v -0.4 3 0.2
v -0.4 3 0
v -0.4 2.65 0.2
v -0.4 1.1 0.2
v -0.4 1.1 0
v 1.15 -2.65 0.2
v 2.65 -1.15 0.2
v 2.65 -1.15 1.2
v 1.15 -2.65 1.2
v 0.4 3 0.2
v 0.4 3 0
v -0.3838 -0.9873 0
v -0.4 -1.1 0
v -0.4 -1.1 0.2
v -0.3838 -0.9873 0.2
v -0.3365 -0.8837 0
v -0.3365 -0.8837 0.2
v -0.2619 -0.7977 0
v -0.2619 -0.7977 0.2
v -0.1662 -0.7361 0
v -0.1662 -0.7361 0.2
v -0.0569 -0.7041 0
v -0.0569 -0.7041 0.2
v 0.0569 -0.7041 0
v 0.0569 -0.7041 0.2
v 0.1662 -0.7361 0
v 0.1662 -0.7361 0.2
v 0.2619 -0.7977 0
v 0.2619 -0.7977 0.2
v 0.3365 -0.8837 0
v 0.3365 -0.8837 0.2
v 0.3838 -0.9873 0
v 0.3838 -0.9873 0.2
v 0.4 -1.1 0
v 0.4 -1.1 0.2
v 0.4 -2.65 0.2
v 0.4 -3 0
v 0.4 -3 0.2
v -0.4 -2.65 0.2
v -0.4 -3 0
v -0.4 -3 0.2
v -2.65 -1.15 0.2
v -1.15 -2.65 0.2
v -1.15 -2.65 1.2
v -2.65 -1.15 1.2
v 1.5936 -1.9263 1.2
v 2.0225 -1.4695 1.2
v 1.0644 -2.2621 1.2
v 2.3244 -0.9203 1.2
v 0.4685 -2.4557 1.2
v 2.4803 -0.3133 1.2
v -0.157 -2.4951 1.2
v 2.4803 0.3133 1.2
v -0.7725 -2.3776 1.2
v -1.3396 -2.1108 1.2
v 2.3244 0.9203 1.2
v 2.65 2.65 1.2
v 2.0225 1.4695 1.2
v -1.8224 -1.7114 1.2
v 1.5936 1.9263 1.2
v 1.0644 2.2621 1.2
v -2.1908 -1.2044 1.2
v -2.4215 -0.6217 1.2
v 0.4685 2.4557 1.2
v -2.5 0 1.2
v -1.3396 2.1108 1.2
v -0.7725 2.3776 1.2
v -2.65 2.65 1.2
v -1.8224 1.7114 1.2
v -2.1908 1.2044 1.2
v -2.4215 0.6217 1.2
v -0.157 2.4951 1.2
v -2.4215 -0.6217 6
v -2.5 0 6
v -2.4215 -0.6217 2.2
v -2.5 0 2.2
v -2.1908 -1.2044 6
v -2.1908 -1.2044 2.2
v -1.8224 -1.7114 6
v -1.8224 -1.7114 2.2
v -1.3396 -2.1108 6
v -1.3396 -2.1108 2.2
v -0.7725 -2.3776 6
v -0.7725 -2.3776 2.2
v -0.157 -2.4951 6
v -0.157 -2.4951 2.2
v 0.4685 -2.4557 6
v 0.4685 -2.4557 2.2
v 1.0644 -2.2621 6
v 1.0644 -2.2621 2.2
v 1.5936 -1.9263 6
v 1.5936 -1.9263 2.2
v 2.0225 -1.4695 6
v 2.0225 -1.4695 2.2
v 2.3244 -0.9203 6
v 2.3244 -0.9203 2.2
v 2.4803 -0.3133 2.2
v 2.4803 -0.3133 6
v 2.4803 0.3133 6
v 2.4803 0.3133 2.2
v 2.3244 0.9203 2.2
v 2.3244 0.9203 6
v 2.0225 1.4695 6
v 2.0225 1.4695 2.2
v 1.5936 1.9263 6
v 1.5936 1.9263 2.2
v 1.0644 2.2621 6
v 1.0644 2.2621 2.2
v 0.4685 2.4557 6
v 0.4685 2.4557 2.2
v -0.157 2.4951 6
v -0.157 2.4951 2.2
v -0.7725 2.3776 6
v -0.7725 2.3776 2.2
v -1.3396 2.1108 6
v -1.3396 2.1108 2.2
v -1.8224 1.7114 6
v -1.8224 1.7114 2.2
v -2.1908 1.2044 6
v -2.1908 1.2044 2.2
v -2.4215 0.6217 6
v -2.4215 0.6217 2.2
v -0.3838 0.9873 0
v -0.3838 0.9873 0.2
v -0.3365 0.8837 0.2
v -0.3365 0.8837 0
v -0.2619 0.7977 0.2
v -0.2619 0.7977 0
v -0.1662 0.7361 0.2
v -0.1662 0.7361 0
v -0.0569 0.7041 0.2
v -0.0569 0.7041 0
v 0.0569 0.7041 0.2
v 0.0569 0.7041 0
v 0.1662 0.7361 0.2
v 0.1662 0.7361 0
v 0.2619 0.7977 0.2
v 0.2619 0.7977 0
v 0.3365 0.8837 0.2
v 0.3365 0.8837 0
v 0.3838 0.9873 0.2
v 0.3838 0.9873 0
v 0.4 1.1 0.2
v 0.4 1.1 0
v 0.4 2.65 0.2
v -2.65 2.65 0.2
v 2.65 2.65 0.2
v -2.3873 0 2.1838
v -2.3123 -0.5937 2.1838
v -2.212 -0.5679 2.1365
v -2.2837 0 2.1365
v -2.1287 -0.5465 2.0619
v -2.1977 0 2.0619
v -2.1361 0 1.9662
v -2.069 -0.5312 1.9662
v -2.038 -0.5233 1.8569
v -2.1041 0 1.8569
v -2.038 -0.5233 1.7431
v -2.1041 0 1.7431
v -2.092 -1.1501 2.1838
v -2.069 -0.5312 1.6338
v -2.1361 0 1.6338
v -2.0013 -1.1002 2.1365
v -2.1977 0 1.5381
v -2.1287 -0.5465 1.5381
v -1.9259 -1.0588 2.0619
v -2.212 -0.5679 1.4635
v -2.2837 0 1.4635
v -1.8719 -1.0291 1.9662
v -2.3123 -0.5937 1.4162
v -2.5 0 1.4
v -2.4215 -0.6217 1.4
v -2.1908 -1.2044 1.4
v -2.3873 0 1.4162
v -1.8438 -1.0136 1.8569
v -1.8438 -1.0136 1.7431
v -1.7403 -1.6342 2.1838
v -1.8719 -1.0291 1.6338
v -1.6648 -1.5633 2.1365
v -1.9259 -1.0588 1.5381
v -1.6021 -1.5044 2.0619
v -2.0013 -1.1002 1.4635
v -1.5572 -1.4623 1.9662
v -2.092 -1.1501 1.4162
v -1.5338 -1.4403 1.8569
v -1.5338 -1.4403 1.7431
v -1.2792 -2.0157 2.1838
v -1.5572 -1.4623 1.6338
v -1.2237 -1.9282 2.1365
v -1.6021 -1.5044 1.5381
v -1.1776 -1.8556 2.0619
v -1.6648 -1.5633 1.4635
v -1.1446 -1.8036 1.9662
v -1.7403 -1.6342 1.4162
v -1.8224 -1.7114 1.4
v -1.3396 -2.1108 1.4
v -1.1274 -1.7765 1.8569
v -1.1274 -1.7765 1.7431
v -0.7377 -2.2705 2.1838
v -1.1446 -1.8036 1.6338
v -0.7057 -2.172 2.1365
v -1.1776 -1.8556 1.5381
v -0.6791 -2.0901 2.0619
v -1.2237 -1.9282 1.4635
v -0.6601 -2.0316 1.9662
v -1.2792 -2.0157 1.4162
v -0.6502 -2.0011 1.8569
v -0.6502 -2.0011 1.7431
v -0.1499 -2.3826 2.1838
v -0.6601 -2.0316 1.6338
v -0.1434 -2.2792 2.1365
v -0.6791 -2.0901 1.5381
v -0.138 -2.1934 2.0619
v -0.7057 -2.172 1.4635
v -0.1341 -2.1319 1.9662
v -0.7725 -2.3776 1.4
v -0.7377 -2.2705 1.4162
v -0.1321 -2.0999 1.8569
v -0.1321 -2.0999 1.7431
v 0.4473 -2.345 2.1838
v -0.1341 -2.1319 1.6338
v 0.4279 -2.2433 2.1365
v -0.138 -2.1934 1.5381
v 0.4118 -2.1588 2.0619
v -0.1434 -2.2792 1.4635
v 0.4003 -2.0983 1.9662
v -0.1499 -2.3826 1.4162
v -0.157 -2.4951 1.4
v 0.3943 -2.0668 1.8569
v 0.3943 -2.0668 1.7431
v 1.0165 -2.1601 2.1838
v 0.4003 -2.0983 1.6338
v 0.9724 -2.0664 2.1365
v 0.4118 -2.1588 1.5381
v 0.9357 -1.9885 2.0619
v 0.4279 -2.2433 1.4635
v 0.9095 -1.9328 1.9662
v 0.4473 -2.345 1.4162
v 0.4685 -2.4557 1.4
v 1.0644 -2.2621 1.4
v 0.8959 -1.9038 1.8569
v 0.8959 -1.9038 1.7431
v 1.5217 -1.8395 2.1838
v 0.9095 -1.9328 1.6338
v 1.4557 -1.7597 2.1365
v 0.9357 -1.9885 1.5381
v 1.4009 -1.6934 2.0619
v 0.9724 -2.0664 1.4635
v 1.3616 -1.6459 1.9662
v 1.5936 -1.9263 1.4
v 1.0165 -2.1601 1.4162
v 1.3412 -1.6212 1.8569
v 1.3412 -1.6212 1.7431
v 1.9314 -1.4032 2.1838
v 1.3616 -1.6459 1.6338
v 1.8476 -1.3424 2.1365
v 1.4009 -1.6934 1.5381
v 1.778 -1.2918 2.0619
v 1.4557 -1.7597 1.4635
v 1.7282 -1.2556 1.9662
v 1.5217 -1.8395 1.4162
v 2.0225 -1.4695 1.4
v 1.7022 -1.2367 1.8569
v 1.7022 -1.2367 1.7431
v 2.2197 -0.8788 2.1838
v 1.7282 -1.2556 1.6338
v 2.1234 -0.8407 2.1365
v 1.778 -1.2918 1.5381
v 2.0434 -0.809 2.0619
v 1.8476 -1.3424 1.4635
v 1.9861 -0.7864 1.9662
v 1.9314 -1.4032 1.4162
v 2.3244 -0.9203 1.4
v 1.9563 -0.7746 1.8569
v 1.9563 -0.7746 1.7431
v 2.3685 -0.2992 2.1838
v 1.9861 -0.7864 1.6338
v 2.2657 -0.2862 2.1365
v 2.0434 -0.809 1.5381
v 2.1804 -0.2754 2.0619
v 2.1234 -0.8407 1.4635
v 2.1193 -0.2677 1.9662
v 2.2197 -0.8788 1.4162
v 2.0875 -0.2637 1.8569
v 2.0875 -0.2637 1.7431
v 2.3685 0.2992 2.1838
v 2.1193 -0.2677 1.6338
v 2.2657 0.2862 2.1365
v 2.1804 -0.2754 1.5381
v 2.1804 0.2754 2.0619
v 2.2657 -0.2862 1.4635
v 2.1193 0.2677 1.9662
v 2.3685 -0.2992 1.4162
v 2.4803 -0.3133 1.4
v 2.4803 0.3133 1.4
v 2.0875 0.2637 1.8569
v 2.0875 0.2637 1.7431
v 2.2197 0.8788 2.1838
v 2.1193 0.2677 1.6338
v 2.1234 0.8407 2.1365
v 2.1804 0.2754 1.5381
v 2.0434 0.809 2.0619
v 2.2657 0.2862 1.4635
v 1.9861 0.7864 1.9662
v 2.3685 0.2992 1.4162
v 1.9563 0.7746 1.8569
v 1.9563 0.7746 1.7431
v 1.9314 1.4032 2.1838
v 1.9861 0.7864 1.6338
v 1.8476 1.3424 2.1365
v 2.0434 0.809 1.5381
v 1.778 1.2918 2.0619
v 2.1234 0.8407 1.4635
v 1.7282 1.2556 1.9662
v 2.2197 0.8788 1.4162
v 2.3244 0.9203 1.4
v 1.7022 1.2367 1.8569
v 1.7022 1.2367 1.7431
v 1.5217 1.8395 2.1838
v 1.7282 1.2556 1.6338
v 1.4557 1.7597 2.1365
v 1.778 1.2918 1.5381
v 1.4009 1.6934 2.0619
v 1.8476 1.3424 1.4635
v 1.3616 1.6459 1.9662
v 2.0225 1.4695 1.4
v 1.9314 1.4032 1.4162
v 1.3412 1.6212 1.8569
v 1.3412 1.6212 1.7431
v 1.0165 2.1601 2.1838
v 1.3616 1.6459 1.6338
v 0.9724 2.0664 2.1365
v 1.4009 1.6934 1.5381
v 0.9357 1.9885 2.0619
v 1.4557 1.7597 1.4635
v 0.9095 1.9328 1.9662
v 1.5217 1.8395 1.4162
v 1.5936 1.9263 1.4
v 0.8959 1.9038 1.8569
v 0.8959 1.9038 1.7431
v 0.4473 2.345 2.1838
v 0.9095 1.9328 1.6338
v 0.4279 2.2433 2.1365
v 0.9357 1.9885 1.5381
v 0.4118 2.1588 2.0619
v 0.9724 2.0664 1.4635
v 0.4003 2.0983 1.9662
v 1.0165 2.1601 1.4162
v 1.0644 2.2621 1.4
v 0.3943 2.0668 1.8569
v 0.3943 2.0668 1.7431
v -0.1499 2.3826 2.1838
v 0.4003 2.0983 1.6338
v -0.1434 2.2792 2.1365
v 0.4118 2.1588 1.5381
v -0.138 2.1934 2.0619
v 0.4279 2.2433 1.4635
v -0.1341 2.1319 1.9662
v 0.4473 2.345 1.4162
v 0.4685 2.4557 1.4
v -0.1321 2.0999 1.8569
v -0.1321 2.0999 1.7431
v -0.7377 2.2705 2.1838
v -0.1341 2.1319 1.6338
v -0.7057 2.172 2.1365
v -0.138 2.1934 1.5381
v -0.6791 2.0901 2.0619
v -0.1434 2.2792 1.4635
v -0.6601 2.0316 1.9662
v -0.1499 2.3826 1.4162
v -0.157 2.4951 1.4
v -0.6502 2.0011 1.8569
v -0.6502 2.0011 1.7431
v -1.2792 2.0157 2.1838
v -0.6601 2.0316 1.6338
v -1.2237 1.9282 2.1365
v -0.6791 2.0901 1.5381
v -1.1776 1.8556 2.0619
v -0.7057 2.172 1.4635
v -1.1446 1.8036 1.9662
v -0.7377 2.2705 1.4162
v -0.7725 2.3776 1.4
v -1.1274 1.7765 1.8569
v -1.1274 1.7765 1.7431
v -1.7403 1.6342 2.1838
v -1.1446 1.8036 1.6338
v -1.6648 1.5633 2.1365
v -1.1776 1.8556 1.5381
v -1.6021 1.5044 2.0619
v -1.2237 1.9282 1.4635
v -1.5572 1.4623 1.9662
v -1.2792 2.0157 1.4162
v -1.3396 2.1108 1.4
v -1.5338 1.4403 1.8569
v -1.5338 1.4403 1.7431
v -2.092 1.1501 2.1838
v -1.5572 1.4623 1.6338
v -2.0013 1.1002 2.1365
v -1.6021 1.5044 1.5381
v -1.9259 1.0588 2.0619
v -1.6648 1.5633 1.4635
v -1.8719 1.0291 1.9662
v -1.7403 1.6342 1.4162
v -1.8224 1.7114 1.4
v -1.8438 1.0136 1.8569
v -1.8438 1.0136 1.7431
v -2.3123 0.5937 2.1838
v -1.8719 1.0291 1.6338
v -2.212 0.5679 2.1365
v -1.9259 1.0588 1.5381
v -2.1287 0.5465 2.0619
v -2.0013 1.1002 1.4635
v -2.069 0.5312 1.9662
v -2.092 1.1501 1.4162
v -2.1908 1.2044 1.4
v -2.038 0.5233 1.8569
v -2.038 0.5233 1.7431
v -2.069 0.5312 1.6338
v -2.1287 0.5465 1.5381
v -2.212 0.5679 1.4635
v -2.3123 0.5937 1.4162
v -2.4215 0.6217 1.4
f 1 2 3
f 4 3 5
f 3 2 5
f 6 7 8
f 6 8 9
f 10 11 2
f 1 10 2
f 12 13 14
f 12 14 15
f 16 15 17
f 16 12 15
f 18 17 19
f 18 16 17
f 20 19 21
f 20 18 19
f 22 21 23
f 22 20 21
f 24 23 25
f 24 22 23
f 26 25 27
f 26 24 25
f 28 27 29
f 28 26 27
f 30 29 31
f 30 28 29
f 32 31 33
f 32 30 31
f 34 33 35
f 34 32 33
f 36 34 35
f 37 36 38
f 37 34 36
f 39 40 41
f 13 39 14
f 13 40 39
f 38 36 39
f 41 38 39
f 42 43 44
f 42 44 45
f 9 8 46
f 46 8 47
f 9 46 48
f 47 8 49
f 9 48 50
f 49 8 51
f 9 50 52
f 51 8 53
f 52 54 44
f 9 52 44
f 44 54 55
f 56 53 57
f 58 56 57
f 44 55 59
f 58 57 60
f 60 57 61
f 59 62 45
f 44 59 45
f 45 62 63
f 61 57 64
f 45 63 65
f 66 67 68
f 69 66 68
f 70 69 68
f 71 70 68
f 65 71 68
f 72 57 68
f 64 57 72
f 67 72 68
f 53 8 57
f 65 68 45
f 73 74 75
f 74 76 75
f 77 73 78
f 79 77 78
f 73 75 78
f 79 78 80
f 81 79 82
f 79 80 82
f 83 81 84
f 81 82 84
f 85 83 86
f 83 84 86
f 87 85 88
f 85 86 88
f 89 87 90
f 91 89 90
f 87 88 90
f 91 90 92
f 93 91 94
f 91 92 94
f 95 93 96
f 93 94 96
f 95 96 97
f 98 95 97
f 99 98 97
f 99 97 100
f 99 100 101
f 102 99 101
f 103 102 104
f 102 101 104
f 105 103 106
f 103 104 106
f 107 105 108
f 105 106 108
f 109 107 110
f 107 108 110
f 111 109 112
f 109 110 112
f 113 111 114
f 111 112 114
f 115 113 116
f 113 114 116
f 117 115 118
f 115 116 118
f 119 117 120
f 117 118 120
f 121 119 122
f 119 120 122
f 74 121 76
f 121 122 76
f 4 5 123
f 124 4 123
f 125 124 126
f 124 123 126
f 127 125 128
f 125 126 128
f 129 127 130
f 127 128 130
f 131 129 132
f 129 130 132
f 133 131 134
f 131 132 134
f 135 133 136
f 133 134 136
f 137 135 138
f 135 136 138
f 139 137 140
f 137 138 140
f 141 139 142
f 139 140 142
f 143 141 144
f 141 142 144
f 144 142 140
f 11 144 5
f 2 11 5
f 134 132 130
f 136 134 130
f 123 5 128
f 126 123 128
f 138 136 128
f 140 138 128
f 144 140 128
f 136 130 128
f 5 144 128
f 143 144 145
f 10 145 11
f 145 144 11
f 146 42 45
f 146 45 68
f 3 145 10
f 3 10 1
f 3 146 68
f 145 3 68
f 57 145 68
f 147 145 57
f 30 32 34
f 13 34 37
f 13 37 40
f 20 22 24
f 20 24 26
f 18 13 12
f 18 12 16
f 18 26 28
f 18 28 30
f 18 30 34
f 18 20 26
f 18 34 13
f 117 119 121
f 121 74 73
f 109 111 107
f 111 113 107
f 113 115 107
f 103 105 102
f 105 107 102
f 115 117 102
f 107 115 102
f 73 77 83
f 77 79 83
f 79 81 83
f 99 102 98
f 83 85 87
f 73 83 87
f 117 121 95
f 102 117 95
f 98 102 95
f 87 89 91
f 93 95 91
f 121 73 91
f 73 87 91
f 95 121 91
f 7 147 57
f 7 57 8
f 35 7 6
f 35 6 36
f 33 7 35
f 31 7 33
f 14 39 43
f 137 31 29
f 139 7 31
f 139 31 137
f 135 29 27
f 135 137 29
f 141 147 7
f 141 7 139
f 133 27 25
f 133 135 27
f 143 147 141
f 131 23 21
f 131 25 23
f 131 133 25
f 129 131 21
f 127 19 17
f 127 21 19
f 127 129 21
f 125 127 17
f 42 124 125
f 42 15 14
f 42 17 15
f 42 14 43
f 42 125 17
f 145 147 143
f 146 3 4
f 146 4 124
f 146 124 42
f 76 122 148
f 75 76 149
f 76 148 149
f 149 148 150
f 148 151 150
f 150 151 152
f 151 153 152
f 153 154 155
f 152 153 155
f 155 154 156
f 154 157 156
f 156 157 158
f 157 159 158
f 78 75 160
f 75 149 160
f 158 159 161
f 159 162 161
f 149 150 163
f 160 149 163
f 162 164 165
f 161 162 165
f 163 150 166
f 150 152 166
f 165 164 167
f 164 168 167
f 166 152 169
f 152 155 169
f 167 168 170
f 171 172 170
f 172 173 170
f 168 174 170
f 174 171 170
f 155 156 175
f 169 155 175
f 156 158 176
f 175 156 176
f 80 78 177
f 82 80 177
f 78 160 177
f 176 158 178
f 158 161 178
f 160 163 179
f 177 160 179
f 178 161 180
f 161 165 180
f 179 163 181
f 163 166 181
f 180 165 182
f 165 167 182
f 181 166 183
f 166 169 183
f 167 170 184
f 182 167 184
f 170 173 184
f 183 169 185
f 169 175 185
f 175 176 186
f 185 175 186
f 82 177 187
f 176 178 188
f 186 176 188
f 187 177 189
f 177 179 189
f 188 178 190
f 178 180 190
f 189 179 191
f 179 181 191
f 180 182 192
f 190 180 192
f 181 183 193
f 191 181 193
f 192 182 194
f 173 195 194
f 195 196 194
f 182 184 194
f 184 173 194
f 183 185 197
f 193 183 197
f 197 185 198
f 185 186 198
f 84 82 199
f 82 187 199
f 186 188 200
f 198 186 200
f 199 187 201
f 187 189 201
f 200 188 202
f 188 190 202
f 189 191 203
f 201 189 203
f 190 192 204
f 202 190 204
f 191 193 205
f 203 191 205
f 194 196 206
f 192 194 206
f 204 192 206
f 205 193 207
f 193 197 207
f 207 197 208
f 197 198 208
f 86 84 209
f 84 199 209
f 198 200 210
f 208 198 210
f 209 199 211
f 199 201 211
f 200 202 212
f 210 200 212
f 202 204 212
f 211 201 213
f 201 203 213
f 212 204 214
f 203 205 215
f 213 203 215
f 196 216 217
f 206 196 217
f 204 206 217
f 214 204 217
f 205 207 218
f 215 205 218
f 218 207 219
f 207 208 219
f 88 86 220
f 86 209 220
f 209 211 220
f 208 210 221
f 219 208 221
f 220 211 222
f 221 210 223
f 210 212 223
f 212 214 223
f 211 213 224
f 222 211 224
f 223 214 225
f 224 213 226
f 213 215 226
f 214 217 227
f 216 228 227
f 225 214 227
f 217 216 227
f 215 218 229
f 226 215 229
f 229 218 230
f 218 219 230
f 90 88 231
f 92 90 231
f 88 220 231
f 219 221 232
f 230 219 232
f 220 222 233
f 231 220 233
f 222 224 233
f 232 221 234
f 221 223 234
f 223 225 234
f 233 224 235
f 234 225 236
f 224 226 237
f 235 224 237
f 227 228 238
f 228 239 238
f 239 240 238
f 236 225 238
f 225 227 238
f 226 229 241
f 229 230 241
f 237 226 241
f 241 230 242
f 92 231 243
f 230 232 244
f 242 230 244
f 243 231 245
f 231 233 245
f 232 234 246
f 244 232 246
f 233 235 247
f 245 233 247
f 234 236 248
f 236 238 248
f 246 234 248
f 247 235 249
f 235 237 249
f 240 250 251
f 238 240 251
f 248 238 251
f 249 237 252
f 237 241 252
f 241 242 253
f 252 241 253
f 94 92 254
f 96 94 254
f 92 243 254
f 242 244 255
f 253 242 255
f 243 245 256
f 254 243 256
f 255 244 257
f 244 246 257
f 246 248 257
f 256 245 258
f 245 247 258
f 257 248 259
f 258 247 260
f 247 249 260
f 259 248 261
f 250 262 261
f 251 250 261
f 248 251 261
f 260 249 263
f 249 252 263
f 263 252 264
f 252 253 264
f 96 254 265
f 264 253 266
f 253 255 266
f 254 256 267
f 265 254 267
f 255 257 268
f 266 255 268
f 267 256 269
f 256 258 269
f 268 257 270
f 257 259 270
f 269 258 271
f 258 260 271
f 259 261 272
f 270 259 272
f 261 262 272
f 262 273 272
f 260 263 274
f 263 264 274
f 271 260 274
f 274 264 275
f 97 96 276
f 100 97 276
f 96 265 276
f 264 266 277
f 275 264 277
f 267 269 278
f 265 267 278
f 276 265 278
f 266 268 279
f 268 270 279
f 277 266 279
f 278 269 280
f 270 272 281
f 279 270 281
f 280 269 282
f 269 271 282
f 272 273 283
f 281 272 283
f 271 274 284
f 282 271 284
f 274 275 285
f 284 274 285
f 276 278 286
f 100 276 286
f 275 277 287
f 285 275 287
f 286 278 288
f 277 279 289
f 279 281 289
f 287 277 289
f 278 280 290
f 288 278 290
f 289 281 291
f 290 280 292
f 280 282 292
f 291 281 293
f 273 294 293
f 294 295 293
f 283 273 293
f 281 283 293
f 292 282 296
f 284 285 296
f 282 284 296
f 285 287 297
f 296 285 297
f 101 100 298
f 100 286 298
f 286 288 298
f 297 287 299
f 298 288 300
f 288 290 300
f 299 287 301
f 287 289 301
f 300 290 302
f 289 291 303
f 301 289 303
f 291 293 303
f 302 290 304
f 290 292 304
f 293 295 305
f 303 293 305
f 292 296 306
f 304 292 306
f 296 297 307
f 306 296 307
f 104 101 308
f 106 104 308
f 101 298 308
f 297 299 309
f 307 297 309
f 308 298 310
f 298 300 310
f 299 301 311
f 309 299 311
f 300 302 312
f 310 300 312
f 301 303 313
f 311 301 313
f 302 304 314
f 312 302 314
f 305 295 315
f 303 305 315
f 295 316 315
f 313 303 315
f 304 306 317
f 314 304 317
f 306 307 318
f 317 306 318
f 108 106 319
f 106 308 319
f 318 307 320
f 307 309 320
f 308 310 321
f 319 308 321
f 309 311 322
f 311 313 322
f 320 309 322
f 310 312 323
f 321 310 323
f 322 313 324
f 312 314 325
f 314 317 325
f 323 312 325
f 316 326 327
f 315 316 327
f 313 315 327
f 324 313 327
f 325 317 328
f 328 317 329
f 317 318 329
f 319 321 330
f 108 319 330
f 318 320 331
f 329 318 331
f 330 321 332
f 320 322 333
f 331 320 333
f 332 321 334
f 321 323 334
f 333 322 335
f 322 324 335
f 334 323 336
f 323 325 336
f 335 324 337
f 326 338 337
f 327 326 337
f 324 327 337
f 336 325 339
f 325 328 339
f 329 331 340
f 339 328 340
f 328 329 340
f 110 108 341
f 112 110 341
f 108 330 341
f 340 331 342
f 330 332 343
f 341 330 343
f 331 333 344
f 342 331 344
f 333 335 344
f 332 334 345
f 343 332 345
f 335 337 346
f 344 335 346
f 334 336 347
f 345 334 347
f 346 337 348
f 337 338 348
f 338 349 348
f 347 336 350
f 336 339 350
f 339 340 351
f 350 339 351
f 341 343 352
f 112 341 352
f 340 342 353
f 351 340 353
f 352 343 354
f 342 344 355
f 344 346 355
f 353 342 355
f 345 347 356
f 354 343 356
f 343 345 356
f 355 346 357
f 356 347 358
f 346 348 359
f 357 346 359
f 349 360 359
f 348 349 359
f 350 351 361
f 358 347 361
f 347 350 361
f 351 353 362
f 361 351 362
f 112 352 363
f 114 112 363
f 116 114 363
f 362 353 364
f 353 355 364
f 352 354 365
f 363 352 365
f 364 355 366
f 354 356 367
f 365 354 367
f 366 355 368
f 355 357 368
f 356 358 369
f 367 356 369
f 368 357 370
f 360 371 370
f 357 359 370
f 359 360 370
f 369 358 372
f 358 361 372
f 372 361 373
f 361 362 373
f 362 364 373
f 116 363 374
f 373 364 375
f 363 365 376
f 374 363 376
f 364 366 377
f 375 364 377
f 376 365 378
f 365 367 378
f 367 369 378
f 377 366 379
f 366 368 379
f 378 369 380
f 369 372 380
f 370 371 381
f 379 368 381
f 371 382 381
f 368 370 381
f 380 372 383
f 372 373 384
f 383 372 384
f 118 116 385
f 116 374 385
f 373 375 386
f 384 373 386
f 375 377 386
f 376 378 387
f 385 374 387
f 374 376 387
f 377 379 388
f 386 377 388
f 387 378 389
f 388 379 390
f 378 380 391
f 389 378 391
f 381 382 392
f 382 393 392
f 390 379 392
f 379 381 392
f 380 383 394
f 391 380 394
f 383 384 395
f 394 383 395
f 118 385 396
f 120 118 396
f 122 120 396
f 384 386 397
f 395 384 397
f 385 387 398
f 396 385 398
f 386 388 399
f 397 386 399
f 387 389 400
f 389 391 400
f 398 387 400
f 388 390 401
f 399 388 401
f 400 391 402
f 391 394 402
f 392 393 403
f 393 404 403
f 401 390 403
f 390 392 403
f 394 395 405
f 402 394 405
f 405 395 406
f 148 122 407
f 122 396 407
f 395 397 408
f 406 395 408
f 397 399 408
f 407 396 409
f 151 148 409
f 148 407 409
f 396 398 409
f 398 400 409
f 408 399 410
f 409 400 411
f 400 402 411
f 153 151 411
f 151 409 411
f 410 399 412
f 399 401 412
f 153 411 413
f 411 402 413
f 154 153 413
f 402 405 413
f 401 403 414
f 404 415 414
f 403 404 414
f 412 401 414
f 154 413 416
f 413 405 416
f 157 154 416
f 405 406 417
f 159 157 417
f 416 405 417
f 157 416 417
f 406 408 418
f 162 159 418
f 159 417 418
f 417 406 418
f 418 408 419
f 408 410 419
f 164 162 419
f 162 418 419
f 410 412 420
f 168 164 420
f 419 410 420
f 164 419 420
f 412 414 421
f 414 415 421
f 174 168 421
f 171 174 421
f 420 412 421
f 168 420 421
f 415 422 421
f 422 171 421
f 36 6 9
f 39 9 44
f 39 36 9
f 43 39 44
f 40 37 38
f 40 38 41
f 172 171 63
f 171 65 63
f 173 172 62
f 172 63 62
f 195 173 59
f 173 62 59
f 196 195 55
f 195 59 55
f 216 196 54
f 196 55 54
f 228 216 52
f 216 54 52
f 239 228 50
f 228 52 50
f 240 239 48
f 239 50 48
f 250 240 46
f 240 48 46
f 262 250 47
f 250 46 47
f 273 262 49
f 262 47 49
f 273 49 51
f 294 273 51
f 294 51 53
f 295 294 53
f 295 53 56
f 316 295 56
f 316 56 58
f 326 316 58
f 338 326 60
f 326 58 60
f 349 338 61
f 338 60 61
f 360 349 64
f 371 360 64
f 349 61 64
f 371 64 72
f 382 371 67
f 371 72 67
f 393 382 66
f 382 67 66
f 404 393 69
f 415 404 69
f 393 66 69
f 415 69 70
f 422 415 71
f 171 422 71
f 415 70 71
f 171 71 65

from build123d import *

# Parameters (mm, degrees)
BOSS_EXTRUDE1_START = 0.2
BOSS_EXTRUDE1_DEPTH = 1
BOSS_EXTRUDE2_DEPTH = 0.2


with BuildPart() as part:
    # Sketch1 → Boss-Extrude1 (new body)
    with BuildSketch(Plane.XY.offset(BOSS_EXTRUDE1_START)):
        Polygon((-2.65, 2.65), (2.65, 2.65), (2.65, -1.15), (1.15, -2.65), (-1.15, -2.65), (-2.65, -1.15), align=None)
    extrude(amount=BOSS_EXTRUDE1_DEPTH)

    # Sketch2 → Revolve1 (revolve)
    with BuildSketch(Plane(origin=(0, 0, 0), x_dir=(0, 0, -1), z_dir=(1, 0, 0)), mode=Mode.PRIVATE) as revolve1_sk:
        with BuildLine():
            Line((-6, 0), (-6, 2.5))
            Line((-6, 2.5), (-2.2, 2.5))
            ThreePointArc((-2.2, 2.5), (-1.8, 2.1), (-1.4, 2.5))
            Line((-1.4, 2.5), (-1.2, 2.5))
            Line((-1.2, 2.5), (-1.2, 0))
            Line((-1.2, 0), (-6, 0))
        make_face()
    revolve(revolve1_sk.sketch.rotate(Axis((0, 0, 0), (0, 0, 1)), 90), axis=Axis((0, 0, 0), (0, 0, 1)))

    # Sketch3 → Boss-Extrude2 (add)
    with BuildSketch(Plane.XY):
        with BuildLine():
            Line((0.4, -1.1), (0.4, -3))
            Line((0.4, -3), (-0.4, -3))
            Line((-0.4, -3), (-0.4, -1.1))
            ThreePointArc((-0.4, -1.1), (0, -0.7), (0.4, -1.1))
        make_face()
    boss_extrude2 = extrude(amount=BOSS_EXTRUDE2_DEPTH)

    # Mirror1: Boss-Extrude2 across plane
    add(boss_extrude2.mirror(Plane.ZX))


solid = part.part
